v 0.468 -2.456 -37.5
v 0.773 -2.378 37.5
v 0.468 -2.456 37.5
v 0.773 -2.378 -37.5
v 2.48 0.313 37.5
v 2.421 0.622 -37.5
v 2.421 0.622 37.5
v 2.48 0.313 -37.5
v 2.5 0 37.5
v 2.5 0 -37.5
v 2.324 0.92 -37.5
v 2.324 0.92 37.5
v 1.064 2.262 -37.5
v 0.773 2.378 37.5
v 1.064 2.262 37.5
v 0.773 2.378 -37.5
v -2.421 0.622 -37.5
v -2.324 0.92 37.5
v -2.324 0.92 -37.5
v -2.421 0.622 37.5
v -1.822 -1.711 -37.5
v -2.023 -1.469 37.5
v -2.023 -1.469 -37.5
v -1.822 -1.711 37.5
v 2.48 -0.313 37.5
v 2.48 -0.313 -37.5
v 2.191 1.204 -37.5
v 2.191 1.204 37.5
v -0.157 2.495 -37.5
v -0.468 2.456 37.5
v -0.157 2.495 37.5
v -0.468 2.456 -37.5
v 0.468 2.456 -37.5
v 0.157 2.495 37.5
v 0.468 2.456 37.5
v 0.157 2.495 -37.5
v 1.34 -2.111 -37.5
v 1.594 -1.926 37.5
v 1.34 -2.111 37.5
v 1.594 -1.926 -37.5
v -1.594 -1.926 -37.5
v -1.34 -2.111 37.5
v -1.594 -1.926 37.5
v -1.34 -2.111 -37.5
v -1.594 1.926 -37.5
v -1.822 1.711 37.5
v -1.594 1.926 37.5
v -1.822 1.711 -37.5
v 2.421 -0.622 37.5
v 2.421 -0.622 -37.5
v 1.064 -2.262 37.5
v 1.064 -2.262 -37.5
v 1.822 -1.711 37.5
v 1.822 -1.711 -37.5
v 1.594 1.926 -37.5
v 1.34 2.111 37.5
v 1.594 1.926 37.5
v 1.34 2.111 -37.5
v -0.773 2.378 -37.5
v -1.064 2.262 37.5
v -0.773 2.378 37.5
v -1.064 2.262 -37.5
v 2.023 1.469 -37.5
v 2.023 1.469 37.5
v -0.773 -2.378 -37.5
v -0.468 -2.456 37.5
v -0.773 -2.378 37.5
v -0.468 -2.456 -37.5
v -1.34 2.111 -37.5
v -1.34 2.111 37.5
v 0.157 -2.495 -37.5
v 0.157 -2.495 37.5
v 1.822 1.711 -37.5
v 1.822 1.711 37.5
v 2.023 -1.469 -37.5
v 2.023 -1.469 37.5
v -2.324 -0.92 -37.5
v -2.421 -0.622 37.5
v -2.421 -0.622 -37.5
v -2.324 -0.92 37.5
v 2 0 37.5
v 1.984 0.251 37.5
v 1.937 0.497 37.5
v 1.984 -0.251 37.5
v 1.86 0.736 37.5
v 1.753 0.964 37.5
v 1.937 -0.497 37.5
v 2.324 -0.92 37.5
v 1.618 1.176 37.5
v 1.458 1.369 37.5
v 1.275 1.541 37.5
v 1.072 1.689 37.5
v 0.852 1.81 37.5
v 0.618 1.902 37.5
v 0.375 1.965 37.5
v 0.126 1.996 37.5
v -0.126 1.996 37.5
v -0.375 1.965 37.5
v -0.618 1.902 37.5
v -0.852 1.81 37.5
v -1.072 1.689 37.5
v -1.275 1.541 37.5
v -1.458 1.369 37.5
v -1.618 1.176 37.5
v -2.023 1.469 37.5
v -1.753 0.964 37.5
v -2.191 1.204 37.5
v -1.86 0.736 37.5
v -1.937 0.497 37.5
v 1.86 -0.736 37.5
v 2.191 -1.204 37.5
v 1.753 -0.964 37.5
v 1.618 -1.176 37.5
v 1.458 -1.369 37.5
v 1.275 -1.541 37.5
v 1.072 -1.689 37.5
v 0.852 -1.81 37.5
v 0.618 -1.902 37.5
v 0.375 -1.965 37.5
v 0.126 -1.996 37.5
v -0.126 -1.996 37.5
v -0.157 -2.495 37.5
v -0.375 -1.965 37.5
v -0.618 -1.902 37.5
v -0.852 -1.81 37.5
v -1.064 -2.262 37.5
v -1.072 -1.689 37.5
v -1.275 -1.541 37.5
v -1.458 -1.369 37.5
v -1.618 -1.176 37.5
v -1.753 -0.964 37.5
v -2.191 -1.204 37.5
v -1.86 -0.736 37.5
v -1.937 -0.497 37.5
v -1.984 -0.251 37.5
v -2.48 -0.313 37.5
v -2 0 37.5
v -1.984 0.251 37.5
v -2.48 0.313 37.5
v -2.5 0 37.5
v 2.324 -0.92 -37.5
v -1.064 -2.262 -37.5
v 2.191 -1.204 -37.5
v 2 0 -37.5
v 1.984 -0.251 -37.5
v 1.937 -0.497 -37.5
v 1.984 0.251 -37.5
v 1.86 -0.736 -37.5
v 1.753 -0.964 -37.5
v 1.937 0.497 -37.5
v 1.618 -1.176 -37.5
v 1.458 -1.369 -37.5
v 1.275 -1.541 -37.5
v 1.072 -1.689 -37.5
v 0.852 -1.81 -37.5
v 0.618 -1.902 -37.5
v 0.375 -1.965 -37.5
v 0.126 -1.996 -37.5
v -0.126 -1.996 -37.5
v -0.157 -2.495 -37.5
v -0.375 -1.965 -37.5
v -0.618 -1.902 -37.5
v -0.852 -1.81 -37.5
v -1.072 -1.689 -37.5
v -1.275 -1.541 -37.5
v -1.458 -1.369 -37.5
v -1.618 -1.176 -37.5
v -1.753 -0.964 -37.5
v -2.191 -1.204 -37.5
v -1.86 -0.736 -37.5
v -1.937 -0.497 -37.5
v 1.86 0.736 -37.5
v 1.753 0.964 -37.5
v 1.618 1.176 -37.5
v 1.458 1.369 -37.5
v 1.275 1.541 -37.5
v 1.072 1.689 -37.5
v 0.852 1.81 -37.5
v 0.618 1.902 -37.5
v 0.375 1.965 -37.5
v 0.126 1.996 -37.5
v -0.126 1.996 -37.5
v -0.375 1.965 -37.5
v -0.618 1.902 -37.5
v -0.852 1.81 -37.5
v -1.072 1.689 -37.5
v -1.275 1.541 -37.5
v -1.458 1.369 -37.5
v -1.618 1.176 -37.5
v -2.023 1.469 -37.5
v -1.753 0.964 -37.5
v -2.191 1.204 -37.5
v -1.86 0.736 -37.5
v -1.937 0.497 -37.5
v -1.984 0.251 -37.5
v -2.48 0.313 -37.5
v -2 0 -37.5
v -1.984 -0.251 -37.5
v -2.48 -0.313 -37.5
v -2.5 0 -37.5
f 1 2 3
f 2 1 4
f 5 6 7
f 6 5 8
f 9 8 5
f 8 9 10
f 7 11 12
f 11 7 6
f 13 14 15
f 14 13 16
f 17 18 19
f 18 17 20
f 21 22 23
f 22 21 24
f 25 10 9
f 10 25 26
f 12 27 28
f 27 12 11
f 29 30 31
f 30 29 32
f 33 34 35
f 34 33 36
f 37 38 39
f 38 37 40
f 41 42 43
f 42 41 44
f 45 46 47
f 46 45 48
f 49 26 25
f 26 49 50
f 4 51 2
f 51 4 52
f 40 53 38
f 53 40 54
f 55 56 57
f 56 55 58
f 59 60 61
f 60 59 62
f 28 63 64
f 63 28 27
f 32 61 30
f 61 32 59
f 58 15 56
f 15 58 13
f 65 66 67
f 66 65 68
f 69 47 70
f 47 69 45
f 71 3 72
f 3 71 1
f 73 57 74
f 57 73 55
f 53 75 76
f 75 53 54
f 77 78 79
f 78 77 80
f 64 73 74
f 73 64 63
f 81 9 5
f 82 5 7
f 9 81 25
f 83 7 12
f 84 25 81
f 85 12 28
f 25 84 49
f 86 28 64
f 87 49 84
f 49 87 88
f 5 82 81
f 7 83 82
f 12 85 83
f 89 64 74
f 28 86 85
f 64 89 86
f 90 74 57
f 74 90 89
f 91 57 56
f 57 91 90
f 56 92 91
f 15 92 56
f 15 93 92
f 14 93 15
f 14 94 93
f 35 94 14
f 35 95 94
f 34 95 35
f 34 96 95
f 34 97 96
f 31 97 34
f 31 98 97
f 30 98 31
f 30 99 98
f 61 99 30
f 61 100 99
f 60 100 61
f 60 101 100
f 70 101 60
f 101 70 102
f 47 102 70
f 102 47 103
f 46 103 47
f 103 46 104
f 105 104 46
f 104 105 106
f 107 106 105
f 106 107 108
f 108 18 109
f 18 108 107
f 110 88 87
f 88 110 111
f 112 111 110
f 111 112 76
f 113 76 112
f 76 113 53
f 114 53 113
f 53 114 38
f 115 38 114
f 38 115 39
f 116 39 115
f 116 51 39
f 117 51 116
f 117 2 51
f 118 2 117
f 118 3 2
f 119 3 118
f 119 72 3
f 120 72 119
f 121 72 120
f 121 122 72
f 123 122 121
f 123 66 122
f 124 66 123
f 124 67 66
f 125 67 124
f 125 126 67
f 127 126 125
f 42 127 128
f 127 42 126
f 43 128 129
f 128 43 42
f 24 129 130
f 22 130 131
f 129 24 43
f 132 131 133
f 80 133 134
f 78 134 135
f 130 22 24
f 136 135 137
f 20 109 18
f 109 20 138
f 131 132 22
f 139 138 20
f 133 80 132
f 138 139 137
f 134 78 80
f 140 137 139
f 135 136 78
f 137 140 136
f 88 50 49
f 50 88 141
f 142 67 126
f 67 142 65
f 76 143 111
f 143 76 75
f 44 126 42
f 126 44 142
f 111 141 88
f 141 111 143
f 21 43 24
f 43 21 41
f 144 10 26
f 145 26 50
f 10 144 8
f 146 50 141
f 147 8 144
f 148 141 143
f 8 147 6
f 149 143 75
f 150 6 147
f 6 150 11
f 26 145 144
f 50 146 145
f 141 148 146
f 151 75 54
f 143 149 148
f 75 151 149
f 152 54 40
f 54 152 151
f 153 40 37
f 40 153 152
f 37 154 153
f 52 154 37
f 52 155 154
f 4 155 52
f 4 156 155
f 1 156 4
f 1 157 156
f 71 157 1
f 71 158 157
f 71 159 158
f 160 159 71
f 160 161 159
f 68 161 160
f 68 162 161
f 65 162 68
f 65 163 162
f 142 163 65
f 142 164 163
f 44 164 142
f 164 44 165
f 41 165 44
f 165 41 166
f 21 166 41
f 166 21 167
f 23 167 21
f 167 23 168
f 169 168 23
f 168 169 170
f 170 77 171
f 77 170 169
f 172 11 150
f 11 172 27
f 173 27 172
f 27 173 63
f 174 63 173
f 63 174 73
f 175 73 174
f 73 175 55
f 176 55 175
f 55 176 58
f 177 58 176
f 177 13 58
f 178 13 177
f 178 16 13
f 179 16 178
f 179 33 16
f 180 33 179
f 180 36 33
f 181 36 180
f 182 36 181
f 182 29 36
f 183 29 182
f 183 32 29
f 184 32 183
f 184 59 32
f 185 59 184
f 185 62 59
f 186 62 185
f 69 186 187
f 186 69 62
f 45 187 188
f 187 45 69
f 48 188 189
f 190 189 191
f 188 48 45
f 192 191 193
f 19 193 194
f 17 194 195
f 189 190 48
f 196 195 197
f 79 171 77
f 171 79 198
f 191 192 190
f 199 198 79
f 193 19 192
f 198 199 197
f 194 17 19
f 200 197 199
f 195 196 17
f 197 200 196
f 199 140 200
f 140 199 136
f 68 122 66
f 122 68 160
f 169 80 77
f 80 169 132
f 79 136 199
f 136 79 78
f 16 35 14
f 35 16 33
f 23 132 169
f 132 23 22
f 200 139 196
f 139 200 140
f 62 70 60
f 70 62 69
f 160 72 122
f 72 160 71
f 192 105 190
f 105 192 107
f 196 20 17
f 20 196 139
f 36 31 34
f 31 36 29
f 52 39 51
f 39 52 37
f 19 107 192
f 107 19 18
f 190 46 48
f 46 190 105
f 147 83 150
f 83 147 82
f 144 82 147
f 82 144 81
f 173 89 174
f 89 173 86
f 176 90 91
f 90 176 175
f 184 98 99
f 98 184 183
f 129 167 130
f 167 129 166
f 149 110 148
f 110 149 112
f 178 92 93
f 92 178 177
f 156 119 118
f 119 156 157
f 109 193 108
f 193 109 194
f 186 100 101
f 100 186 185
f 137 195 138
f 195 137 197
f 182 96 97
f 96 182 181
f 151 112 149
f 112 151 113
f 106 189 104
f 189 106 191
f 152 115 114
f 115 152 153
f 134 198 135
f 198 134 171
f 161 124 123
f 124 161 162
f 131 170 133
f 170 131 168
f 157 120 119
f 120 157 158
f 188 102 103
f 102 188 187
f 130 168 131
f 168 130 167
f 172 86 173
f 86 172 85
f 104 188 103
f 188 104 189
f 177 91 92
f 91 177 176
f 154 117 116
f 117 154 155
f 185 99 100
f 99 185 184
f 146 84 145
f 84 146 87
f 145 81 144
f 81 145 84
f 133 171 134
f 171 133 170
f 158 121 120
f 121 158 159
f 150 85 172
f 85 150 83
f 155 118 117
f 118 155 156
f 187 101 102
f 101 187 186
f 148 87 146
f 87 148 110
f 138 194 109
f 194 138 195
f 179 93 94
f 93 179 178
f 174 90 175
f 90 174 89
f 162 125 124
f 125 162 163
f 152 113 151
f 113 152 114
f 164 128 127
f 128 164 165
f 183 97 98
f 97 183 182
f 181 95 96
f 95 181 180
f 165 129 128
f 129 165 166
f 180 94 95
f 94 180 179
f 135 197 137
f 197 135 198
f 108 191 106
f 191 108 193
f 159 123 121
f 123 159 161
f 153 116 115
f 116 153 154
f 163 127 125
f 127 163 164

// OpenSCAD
$fn = 50;


difference() {
	union() {
		translate(v = [0, 0, -37.5000000000]) {
			cylinder(h = 75, r = 2.5000000000);
		}
	}
	union() {
		translate(v = [0, 0, -100.0000000000]) {
			cylinder(h = 200, r = 2.0000000000);
		}
	}
}
